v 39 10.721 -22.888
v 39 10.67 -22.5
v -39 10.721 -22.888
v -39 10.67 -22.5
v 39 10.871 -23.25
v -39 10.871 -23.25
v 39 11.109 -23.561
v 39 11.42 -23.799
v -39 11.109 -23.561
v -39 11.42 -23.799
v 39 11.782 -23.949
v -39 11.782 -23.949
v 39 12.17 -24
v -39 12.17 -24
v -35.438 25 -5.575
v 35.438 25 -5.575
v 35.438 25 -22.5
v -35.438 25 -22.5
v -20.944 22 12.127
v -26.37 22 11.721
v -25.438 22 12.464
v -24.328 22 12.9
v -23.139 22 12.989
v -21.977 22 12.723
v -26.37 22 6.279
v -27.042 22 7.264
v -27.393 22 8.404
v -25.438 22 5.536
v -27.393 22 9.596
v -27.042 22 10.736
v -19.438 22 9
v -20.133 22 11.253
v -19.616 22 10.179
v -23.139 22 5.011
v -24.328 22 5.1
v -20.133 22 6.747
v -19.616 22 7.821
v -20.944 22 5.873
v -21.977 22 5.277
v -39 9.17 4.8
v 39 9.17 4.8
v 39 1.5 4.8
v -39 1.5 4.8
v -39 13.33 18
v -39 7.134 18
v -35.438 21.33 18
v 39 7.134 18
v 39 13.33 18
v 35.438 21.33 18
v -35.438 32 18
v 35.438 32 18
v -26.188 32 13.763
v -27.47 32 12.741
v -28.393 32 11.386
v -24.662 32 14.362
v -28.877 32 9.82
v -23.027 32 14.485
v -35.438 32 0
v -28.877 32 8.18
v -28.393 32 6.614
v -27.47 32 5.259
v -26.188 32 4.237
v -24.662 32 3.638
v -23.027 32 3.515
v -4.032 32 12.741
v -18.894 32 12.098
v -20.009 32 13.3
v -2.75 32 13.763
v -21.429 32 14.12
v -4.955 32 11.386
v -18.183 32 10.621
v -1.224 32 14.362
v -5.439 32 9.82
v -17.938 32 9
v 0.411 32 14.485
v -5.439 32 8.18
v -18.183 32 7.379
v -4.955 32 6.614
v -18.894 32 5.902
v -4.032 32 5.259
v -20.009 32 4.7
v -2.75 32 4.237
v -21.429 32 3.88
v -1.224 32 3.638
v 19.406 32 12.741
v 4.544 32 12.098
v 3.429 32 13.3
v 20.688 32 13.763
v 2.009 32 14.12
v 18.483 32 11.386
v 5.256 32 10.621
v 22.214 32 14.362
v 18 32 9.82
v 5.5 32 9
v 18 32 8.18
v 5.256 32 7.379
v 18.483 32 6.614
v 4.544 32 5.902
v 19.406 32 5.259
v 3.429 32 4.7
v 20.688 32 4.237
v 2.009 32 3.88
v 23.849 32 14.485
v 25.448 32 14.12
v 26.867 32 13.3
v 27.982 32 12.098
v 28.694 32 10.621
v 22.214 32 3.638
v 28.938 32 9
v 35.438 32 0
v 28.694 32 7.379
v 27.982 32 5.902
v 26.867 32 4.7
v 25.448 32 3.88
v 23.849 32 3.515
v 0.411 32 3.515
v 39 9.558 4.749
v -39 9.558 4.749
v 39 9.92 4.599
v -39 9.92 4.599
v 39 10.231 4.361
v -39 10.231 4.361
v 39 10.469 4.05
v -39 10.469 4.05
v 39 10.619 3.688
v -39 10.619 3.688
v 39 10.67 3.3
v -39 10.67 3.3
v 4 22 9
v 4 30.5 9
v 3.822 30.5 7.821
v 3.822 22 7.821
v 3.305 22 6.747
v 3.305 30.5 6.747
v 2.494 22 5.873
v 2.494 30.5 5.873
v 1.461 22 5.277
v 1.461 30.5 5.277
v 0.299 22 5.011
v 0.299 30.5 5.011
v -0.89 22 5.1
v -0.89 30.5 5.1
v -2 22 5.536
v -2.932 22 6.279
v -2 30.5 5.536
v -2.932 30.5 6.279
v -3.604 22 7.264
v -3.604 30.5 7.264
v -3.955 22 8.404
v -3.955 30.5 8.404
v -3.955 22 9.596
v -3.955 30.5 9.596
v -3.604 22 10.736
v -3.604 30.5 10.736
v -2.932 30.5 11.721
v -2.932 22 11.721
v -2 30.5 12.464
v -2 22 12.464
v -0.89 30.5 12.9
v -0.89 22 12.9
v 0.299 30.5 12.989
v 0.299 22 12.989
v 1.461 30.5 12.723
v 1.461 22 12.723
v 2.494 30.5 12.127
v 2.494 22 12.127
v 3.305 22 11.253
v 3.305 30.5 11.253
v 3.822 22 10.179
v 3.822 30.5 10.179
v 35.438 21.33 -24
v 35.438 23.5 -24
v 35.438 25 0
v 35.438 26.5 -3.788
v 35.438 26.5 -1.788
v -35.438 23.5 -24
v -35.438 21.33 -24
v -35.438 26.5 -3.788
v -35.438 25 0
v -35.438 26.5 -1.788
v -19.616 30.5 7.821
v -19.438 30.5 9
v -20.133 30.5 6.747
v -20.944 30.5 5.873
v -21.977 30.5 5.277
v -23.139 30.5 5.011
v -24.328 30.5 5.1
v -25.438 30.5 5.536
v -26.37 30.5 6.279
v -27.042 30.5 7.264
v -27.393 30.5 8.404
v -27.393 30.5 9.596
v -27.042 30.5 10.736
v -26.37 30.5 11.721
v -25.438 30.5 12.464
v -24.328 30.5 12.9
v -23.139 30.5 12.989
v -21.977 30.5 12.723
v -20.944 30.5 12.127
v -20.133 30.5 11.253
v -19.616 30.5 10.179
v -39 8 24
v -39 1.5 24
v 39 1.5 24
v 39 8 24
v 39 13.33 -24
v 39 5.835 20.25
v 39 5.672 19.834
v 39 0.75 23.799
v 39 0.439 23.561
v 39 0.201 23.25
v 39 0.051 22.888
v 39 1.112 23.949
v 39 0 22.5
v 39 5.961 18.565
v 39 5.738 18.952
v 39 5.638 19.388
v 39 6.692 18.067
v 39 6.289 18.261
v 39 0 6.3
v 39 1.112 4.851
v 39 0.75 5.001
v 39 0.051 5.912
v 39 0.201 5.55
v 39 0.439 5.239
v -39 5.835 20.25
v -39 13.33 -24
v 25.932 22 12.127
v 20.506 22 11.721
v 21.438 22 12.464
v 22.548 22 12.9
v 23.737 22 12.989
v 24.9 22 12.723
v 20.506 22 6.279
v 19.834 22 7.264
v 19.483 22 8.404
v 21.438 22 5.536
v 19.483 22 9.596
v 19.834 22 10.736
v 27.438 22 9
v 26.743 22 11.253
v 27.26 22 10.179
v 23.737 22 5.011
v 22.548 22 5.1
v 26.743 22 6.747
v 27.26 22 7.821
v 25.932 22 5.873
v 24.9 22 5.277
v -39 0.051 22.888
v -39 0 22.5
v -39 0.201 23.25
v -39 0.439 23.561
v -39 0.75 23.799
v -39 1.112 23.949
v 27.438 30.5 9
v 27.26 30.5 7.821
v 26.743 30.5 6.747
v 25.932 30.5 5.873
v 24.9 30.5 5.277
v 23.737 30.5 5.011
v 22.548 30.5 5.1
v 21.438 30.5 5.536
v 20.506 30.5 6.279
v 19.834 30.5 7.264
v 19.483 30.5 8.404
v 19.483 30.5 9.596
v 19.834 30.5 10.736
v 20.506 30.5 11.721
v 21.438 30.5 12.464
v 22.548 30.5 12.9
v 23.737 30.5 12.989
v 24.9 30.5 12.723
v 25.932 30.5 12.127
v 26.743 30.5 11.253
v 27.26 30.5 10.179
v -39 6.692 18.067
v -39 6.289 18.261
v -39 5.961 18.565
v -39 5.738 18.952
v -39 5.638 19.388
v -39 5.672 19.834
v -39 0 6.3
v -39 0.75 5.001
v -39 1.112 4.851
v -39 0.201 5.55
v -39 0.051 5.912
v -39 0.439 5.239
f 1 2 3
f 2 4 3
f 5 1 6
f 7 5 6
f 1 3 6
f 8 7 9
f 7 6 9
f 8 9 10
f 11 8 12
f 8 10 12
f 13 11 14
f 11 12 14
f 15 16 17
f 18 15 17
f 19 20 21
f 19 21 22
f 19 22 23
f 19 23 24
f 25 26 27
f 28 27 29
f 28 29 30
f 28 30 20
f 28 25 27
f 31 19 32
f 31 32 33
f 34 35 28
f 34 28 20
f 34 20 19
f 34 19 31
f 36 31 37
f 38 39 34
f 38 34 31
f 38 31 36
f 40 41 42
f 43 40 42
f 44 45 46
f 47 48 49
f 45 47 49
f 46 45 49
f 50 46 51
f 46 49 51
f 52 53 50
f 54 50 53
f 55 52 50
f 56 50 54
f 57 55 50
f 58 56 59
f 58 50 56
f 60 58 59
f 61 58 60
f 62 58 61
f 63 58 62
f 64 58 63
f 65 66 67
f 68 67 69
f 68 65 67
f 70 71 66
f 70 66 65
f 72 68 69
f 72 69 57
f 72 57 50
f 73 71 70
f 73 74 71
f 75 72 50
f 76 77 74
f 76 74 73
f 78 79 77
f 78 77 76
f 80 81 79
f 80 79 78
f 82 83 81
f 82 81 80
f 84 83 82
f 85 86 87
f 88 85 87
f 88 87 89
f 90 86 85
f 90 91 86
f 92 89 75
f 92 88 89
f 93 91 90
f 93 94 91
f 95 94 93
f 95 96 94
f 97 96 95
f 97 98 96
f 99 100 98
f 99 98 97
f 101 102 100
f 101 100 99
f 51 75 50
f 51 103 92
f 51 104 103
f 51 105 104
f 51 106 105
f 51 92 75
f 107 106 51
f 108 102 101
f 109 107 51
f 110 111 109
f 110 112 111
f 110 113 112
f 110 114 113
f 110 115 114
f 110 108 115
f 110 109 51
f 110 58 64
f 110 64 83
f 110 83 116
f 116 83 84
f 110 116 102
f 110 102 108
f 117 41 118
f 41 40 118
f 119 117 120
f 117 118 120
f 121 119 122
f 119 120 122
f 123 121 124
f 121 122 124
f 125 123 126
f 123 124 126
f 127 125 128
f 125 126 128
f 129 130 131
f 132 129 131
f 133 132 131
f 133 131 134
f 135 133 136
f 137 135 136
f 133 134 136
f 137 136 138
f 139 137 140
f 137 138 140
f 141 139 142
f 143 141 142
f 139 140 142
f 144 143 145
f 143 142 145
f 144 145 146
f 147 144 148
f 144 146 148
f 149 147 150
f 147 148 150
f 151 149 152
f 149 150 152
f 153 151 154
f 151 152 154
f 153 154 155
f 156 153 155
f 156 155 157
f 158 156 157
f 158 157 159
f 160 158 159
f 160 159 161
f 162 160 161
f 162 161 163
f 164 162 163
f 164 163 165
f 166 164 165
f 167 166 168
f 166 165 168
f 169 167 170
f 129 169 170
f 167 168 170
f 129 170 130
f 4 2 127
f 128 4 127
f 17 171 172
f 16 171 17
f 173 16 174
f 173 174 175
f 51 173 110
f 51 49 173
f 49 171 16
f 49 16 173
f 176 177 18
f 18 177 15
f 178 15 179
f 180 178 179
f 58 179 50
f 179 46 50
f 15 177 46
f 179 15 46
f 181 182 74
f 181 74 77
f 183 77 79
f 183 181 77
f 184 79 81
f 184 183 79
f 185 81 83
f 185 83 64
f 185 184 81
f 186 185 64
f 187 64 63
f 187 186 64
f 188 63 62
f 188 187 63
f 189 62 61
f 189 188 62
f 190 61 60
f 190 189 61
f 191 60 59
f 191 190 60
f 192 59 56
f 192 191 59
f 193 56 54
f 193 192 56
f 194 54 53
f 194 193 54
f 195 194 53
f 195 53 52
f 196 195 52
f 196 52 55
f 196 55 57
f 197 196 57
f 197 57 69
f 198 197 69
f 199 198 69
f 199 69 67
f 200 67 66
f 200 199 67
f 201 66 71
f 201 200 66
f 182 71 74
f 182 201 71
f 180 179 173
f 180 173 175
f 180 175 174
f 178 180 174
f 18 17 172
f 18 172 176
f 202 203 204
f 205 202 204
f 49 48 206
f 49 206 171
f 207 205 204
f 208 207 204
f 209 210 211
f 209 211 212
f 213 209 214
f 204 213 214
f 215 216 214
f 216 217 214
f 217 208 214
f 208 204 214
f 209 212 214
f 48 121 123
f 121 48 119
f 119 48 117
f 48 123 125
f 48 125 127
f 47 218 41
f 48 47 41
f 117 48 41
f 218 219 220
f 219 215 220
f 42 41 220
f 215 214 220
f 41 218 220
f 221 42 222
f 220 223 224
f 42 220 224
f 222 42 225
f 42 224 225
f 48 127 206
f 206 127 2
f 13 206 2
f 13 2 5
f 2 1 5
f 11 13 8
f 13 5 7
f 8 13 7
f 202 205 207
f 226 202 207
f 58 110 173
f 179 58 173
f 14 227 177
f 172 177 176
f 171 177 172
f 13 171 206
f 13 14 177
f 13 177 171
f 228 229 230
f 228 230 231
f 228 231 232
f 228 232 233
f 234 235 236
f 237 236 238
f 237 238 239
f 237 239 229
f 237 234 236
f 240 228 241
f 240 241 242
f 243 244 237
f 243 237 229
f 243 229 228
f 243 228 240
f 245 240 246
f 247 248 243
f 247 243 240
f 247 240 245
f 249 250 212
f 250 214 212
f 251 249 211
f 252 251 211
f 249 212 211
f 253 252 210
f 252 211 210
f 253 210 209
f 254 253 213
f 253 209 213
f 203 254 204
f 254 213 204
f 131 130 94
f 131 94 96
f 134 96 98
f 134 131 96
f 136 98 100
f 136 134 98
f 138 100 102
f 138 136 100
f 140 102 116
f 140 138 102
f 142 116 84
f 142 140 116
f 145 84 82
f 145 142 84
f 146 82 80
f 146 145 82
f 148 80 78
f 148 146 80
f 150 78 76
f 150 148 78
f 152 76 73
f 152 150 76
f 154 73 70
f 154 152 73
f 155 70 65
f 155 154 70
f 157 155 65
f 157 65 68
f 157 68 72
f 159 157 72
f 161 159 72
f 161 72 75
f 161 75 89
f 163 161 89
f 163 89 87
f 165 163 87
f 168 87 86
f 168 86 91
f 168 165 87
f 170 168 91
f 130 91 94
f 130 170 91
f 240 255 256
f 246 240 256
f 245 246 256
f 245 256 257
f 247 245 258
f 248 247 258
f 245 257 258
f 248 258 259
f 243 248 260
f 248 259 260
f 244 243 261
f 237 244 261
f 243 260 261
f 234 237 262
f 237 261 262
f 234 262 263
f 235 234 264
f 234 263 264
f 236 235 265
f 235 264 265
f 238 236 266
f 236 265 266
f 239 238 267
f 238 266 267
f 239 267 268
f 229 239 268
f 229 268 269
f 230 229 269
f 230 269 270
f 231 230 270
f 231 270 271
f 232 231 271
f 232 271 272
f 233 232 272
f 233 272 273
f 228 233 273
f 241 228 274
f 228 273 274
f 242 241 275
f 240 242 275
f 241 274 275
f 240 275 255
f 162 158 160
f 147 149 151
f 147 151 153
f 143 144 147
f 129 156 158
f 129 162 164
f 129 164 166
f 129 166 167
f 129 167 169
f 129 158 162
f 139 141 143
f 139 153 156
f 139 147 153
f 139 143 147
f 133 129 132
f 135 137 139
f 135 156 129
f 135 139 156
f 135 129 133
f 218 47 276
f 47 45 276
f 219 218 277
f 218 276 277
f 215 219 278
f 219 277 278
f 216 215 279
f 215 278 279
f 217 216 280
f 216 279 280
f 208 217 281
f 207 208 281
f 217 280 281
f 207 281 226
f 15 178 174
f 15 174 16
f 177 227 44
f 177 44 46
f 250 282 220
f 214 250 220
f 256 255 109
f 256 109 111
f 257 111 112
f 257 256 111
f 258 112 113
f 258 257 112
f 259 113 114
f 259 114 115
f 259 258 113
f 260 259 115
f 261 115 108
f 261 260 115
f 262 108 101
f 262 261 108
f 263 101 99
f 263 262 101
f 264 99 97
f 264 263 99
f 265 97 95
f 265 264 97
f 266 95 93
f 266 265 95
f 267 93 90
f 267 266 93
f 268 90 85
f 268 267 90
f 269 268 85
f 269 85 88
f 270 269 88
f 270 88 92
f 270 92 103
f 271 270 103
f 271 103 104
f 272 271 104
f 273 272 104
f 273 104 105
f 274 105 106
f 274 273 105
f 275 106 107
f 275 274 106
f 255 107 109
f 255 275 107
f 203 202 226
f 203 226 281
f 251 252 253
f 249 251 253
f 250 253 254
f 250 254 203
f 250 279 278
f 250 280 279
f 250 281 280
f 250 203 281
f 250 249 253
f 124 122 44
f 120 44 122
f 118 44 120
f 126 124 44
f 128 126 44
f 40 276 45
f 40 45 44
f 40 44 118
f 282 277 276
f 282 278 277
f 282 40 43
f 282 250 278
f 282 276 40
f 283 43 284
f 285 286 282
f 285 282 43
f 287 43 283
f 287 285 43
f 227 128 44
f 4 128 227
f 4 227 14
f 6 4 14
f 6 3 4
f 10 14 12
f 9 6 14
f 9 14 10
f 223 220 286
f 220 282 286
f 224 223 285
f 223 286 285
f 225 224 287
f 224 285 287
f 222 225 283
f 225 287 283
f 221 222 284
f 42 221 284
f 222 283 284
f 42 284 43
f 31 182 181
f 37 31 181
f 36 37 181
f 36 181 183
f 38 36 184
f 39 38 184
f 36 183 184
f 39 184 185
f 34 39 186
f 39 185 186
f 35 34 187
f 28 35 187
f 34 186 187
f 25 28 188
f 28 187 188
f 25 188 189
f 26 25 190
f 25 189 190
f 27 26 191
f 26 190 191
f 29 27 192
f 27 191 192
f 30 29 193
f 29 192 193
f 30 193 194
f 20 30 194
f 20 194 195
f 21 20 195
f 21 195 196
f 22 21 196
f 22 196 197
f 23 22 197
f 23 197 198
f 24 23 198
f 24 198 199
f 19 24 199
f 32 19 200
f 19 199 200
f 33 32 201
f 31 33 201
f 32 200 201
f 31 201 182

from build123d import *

# Parameters (mm, degrees)
SKETCH1_W               = 78
SKETCH1_H               = 48
BOSS_EXTRUDE1_DEPTH     = 32
CUT_EXTRUDE1_DEPTH      = 1
CUT_EXTRUDE1_DEPTH_BACK = 49
SKETCH3_OUTSIDE_W       = 69.404
SKETCH3_OUTSIDE_H       = 53.404
CUT_EXTRUDE3_DEPTH      = 1
CUT_EXTRUDE3_DEPTH_BACK = 79
FILLET1_R               = 1.5
SKETCH4_R               = 4
CUT_EXTRUDE4_DEPTH      = 1
CUT_EXTRUDE4_DEPTH_BACK = 10
CHAMFER1_SIZE           = 1.5


with BuildPart() as part:
    # Sketch1 → Boss-Extrude1 (new body)
    with BuildSketch(Plane(origin=(0, 0, 0), x_dir=(1, 0, 0), z_dir=(0, 1, 0))):
        Rectangle(SKETCH1_W, SKETCH1_H)
    extrude(amount=BOSS_EXTRUDE1_DEPTH)

    # Sketch2 → Cut-Extrude1 (cut, two sides)
    with BuildSketch(Plane.XY.offset(24)) as cut_extrude1_sk:
        Polygon((-39, 13.33), (-35.438170518, 21.33), (-35.438170518, 32), (-39, 32), align=None)
        Polygon((35.438170518, 21.33), (35.438170518, 32), (39, 32), (39, 13.33), align=None)
    extrude(amount=CUT_EXTRUDE1_DEPTH, mode=Mode.SUBTRACT)
    extrude(cut_extrude1_sk.sketch, amount=-CUT_EXTRUDE1_DEPTH_BACK, mode=Mode.SUBTRACT)

    # Sketch3 outside → Cut-Extrude3 (cut, two sides)
    with BuildSketch(Plane(origin=(39, 0, 0), x_dir=(0, 0, -1), z_dir=(1, 0, 0))) as cut_extrude3_sk:
        with Locations((0, 16)):
            Rectangle(SKETCH3_OUTSIDE_W, SKETCH3_OUTSIDE_H)
        Polygon((-24, 8), (-18, 4.535898385), (-18, 32), (0, 32), (0, 25), (1.787630389, 26.5), (3.787630389, 26.5), (5.575260778, 25), (24, 25), (24, 10.67), (-4.8, 10.67), (-4.8, 0), (-24, 0), align=None, mode=Mode.SUBTRACT)
    extrude(amount=CUT_EXTRUDE3_DEPTH, mode=Mode.SUBTRACT)
    extrude(cut_extrude3_sk.sketch, amount=-CUT_EXTRUDE3_DEPTH_BACK, mode=Mode.SUBTRACT)

    # Fillet1
    fillet1_edges = [part.edges().sort_by_distance(p)[0] for p in [
        (0, 0, 24),
        (0, 10.67, 4.8),
        (0, 4.535898385, 18),
        (0, 0, 4.8),
        (0, 10.67, -24),
    ]]
    fillet(fillet1_edges, radius=FILLET1_R)

    # Sketch4 → Cut-Extrude4 (cut, two sides)
    with BuildSketch(Plane(origin=(0, 32, 0), x_dir=(1, 0, 0), z_dir=(0, 1, 0))) as cut_extrude4_sk:
        with Locations((0, -9)):
            Circle(SKETCH4_R)
        with Locations((23.438170518, -9)):
            Circle(SKETCH4_R)
        with Locations((-23.438170518, -9)):
            Circle(SKETCH4_R)
    extrude(amount=CUT_EXTRUDE4_DEPTH, mode=Mode.SUBTRACT)
    extrude(cut_extrude4_sk.sketch, amount=-CUT_EXTRUDE4_DEPTH_BACK, mode=Mode.SUBTRACT)

    # Chamfer1
    chamfer1_edges = [part.edges().sort_by_distance(p)[0] for p in [
        (-27.438170518, 32, 9),
        (19.438170518, 32, 9),
        (-4, 32, 9),
        (0, 25, -24),
    ]]
    chamfer(chamfer1_edges, length=CHAMFER1_SIZE)


solid = part.part
